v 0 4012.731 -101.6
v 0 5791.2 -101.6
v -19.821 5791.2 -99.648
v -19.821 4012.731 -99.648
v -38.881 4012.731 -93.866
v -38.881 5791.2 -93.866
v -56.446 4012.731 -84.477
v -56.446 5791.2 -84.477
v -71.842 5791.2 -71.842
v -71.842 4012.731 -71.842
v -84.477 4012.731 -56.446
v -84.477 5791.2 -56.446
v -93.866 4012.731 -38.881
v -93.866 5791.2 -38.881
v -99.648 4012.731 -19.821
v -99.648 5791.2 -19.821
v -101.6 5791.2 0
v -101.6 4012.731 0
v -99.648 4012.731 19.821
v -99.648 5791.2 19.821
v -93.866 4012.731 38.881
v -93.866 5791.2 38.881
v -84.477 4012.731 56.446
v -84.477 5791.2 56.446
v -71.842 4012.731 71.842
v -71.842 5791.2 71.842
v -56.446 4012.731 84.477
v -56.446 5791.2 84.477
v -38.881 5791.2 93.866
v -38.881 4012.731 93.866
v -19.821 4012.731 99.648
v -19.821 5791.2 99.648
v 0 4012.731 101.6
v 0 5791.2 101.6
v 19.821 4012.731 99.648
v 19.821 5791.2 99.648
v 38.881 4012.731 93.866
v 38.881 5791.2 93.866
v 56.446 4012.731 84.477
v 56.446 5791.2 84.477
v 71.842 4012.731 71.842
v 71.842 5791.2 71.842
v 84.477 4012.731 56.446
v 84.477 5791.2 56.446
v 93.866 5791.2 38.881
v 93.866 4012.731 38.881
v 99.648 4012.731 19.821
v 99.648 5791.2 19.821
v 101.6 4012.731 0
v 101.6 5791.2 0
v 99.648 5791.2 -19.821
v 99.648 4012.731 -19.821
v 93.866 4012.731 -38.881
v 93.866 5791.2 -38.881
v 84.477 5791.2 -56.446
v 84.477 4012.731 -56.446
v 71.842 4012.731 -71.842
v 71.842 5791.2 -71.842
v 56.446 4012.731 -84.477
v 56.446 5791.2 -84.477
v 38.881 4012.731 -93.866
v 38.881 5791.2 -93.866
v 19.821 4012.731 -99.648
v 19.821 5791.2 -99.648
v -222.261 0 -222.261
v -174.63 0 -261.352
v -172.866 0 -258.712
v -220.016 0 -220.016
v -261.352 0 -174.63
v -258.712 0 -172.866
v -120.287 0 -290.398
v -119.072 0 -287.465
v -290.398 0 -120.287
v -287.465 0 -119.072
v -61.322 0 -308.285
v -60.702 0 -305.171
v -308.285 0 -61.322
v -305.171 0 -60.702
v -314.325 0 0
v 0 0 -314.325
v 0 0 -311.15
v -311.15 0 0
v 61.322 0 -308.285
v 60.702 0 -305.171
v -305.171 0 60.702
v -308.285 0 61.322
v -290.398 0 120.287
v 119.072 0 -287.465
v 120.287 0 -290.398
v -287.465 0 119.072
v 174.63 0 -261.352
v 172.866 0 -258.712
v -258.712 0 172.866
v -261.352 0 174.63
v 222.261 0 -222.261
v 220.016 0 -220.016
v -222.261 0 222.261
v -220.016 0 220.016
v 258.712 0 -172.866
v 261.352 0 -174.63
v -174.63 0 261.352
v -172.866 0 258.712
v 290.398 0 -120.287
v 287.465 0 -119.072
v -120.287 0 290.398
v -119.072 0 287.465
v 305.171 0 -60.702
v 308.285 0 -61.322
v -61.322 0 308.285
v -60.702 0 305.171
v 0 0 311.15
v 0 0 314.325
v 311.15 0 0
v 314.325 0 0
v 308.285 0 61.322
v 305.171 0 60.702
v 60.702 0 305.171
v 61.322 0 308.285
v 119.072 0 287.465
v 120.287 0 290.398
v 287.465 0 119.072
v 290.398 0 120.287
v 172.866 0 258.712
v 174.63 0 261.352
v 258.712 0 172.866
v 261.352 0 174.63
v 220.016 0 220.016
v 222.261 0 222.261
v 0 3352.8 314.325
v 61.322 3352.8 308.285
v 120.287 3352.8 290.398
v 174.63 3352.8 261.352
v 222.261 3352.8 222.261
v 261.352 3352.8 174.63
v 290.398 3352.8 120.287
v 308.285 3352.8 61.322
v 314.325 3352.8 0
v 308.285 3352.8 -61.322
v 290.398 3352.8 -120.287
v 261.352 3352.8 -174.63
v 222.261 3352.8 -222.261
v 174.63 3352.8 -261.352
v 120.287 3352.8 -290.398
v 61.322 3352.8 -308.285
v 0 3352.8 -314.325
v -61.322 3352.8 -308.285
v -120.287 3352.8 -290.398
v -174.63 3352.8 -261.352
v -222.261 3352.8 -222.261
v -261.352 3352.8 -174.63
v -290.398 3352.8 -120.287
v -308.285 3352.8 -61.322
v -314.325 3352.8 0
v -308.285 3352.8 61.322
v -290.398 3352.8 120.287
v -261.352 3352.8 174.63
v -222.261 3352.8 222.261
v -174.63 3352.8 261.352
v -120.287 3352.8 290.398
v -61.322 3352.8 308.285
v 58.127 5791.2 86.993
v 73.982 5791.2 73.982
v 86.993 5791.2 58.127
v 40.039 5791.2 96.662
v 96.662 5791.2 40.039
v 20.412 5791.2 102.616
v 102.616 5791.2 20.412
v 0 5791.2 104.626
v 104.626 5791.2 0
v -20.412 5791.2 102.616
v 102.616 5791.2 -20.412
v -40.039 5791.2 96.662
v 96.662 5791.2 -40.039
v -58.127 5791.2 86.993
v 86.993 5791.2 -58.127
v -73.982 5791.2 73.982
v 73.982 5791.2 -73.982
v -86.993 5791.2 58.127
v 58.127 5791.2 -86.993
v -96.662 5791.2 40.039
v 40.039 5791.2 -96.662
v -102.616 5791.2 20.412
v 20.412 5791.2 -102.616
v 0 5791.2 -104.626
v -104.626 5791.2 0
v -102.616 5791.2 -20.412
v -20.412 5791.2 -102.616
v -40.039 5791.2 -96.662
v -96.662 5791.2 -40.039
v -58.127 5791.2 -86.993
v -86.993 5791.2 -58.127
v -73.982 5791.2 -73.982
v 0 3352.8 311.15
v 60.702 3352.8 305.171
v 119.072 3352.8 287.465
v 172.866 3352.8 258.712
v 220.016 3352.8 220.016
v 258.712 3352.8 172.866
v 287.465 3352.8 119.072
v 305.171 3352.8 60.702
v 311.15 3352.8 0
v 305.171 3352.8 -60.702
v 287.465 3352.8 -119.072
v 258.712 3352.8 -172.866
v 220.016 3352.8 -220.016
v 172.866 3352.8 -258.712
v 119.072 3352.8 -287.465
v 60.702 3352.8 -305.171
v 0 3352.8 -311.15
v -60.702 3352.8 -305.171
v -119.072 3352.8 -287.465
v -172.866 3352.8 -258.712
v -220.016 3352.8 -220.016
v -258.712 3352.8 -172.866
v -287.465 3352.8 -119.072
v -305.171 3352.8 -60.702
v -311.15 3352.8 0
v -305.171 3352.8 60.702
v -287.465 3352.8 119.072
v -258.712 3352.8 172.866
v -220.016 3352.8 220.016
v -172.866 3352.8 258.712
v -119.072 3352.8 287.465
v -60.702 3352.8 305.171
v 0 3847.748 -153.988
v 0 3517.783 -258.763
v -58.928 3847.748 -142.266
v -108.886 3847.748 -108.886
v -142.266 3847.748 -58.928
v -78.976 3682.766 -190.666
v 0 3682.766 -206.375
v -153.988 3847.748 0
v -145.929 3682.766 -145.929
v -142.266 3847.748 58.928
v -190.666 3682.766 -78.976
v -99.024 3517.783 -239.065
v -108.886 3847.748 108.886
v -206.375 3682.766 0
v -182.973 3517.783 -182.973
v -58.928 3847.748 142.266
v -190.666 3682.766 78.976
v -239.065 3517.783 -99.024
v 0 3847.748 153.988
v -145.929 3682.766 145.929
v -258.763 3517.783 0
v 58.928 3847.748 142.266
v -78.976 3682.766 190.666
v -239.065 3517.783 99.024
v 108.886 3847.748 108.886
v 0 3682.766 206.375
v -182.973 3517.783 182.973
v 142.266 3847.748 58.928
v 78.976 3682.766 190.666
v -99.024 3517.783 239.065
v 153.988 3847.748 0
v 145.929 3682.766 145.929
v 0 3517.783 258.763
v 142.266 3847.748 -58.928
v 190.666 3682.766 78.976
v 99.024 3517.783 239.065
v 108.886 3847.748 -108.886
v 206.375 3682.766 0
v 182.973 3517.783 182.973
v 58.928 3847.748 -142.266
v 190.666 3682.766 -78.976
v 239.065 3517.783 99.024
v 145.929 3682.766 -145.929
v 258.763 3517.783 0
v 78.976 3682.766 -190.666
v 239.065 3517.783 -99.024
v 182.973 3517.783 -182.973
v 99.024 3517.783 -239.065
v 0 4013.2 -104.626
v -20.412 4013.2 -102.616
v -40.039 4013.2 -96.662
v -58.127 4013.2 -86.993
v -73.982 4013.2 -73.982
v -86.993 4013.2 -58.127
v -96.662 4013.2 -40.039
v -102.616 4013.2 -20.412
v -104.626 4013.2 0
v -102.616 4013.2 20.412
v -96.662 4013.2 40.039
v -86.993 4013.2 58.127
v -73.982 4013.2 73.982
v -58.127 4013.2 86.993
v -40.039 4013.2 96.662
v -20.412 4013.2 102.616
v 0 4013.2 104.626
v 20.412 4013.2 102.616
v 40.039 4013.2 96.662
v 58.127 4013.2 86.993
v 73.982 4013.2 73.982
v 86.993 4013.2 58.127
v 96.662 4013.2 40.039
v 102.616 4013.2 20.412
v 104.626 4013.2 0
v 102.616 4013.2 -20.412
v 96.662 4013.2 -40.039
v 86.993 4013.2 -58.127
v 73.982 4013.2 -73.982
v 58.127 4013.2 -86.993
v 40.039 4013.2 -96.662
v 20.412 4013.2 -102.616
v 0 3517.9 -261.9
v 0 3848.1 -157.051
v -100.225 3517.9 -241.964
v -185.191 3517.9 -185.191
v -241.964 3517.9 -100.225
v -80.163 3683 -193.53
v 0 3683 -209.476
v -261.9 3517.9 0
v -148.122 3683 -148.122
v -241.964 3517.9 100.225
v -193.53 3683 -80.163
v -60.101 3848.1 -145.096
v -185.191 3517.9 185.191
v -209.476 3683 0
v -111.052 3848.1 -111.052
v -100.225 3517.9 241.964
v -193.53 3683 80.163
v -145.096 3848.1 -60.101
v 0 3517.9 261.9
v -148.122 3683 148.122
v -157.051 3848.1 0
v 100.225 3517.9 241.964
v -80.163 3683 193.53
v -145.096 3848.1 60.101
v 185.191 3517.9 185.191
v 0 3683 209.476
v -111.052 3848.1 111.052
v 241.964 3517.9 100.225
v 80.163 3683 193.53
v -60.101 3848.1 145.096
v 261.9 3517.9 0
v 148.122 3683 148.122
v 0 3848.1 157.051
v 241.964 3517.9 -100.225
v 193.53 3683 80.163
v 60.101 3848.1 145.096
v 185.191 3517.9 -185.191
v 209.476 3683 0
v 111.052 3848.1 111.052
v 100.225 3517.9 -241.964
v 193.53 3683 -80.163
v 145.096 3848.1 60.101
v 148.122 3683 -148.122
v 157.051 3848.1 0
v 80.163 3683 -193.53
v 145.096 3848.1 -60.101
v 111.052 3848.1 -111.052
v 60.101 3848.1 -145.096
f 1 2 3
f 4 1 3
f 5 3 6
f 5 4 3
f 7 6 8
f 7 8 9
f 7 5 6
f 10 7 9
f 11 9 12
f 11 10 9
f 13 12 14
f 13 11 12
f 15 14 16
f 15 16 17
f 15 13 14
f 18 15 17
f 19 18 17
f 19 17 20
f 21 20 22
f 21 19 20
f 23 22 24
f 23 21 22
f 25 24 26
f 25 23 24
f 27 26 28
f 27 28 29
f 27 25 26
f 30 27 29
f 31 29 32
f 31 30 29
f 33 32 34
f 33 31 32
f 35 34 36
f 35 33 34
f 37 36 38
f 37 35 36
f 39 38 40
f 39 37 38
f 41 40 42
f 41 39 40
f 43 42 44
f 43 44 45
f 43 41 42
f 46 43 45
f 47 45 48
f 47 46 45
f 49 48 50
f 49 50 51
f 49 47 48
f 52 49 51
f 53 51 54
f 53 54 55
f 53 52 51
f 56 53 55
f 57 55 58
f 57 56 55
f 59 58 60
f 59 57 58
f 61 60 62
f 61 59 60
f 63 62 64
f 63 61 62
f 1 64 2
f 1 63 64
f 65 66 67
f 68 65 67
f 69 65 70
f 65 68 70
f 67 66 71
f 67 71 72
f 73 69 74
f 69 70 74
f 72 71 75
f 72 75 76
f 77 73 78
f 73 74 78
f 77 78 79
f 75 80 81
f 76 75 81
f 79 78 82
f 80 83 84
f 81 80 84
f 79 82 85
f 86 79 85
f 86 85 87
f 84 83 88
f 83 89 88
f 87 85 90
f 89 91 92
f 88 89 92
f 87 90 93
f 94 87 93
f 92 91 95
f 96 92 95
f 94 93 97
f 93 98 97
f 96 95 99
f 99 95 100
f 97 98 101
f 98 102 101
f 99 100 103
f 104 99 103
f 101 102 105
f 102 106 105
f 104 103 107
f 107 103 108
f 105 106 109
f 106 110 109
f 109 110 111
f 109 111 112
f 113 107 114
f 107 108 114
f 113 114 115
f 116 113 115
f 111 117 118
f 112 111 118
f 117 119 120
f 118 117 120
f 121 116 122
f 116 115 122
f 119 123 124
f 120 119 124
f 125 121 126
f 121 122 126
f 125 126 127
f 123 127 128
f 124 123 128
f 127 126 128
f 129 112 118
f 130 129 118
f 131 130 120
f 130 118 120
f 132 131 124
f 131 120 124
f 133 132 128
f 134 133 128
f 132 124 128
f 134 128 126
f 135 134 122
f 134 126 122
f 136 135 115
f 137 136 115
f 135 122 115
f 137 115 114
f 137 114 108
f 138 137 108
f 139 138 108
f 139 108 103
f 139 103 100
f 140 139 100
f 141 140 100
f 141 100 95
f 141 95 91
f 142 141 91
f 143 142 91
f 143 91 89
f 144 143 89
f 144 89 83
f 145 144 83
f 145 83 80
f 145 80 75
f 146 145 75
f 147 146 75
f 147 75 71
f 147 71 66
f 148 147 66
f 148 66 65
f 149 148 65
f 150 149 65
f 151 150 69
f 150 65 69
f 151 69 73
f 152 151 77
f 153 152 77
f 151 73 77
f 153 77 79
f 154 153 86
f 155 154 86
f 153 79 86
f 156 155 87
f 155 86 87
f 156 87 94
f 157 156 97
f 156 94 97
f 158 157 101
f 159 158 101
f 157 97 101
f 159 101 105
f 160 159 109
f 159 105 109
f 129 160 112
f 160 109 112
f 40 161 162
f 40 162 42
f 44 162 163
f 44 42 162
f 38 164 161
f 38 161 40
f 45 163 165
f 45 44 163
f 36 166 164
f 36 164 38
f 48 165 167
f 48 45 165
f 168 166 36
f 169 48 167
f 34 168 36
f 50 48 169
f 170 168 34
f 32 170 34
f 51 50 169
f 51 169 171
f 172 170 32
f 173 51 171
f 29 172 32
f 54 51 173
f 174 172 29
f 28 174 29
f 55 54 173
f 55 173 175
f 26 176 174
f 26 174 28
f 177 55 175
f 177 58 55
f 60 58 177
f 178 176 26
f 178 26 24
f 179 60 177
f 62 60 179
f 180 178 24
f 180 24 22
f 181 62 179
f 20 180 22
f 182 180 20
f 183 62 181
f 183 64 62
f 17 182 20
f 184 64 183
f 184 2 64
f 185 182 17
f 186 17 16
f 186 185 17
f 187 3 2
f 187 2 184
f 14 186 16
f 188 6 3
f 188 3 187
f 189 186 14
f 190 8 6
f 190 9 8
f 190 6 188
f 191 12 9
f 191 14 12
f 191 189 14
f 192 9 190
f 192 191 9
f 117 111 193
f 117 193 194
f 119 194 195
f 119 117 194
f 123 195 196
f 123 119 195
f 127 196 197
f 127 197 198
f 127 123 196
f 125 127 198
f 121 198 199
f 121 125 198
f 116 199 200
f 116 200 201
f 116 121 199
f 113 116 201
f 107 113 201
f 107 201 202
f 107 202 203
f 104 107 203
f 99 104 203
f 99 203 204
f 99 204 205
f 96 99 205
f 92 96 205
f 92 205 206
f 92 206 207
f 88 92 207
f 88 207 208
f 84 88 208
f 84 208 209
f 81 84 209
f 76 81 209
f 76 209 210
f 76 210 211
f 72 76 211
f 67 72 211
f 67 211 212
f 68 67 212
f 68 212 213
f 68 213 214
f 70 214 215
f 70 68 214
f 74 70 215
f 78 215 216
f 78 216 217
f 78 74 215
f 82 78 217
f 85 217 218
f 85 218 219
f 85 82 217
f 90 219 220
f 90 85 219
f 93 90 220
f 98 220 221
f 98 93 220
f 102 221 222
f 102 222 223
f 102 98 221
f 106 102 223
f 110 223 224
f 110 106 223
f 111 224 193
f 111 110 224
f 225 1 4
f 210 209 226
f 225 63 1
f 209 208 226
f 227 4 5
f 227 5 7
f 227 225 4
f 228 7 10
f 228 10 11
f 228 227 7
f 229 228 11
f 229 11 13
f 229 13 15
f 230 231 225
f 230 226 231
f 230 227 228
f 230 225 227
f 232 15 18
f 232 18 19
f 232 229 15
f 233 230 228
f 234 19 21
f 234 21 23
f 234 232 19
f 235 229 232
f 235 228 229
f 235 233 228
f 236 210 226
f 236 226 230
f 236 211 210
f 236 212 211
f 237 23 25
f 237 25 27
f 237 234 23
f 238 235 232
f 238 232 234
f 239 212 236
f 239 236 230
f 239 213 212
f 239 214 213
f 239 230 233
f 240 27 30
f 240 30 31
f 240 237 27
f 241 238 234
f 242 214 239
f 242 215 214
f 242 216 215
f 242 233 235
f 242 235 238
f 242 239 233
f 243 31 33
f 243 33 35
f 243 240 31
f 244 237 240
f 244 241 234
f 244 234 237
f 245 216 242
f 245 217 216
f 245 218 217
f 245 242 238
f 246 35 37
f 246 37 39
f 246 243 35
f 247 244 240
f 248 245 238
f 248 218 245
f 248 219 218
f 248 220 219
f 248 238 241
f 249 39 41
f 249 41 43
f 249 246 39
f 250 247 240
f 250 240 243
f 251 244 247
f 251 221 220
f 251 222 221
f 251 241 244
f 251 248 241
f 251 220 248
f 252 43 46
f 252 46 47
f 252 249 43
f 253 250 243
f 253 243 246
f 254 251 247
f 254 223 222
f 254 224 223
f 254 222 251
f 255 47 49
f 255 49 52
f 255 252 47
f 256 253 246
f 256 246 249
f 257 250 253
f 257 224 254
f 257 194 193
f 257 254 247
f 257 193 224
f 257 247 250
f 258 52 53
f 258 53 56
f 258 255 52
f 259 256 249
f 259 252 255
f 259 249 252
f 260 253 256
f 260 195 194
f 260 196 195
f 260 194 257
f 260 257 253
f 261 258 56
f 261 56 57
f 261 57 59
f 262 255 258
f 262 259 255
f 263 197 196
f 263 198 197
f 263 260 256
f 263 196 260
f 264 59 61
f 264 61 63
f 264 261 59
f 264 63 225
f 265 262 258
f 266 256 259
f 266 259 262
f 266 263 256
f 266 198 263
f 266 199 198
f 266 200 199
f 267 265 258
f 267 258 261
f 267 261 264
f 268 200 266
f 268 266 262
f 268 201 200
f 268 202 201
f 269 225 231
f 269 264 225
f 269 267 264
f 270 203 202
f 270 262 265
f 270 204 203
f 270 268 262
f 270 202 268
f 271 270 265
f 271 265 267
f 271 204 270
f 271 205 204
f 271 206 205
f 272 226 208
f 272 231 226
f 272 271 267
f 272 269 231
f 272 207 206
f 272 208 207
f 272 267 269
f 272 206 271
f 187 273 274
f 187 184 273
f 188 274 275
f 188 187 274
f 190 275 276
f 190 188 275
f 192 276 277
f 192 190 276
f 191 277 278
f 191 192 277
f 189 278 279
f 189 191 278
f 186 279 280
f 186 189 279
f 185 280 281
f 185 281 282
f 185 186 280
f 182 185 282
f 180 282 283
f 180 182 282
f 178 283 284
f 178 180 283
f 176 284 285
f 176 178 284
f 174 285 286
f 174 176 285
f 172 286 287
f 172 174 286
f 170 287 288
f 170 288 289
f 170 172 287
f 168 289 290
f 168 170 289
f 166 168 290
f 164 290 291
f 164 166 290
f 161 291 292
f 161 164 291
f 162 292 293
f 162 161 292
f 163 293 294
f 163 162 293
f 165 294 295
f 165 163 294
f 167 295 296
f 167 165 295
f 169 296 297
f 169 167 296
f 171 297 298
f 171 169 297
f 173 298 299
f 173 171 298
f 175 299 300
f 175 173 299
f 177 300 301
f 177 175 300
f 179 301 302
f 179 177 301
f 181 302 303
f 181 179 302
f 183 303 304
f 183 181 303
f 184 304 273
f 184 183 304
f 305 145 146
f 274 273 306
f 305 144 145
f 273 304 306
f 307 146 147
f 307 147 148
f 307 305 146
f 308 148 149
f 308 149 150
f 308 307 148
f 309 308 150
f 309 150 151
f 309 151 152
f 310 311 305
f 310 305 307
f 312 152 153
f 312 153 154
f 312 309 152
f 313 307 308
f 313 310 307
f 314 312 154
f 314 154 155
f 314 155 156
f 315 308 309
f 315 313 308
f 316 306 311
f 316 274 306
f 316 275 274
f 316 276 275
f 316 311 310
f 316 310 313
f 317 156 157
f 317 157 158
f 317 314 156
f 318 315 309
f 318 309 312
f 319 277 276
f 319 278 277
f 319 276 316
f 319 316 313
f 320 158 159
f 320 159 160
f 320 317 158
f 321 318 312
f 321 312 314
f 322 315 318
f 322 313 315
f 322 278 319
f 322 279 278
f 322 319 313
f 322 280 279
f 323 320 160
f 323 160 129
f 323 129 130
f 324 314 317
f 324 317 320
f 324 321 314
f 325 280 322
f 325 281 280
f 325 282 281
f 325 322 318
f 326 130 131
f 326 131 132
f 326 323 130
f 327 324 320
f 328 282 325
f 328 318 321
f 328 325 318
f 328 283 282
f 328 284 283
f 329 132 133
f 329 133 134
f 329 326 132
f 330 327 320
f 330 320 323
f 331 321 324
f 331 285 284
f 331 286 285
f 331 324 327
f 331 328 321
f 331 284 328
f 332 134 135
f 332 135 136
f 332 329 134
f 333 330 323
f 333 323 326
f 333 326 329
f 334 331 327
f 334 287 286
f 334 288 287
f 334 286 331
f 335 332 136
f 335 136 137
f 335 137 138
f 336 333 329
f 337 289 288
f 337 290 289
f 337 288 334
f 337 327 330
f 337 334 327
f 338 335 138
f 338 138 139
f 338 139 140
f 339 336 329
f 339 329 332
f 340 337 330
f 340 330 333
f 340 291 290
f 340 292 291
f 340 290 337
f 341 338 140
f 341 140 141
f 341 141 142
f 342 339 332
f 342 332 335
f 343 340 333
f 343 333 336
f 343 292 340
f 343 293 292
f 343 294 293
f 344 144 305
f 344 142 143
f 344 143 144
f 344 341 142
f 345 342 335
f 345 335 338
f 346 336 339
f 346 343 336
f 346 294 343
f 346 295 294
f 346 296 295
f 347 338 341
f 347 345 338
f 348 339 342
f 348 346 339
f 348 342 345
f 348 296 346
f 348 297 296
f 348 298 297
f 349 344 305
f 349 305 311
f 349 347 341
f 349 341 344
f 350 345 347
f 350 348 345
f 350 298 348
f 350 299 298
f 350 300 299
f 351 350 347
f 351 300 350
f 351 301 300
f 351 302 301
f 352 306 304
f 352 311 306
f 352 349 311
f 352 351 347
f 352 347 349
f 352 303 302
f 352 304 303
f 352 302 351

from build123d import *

# Parameters (mm, degrees)
SKETCH1_R           = 314.325
SKETCH1_R_2         = 311.15
BOSS_EXTRUDE1_DEPTH = 3352.8


with BuildPart() as part:
    # Sketch1 → Boss-Extrude1 (new body)
    with BuildSketch(Plane(origin=(0, 0, 0), x_dir=(1, 0, 0), z_dir=(0, 1, 0))):
        with Locations(Location((0, 0, 0), (0, 0, 270))):
            Circle(SKETCH1_R)
        with Locations(Location((0, 0, 0), (0, 0, 270))):
            Circle(SKETCH1_R_2, mode=Mode.SUBTRACT)
    extrude(amount=BOSS_EXTRUDE1_DEPTH)

    # Sketch2 → Revolve1 (revolve)
    with BuildSketch(Plane.XY, mode=Mode.PRIVATE) as revolve1_sk:
        Polygon((-314.325, 3352.8), (-104.626105977, 4013.2), (-104.626105977, 5791.2), (-101.6, 5791.2), (-101.6, 4012.73109141), (-311.15, 3352.8), align=None)
    revolve(revolve1_sk.sketch.rotate(Axis((0, 3352.8, 0), (0, 1, 0)), 270), axis=Axis((0, 3352.8, 0), (0, 1, 0)))


solid = part.part
